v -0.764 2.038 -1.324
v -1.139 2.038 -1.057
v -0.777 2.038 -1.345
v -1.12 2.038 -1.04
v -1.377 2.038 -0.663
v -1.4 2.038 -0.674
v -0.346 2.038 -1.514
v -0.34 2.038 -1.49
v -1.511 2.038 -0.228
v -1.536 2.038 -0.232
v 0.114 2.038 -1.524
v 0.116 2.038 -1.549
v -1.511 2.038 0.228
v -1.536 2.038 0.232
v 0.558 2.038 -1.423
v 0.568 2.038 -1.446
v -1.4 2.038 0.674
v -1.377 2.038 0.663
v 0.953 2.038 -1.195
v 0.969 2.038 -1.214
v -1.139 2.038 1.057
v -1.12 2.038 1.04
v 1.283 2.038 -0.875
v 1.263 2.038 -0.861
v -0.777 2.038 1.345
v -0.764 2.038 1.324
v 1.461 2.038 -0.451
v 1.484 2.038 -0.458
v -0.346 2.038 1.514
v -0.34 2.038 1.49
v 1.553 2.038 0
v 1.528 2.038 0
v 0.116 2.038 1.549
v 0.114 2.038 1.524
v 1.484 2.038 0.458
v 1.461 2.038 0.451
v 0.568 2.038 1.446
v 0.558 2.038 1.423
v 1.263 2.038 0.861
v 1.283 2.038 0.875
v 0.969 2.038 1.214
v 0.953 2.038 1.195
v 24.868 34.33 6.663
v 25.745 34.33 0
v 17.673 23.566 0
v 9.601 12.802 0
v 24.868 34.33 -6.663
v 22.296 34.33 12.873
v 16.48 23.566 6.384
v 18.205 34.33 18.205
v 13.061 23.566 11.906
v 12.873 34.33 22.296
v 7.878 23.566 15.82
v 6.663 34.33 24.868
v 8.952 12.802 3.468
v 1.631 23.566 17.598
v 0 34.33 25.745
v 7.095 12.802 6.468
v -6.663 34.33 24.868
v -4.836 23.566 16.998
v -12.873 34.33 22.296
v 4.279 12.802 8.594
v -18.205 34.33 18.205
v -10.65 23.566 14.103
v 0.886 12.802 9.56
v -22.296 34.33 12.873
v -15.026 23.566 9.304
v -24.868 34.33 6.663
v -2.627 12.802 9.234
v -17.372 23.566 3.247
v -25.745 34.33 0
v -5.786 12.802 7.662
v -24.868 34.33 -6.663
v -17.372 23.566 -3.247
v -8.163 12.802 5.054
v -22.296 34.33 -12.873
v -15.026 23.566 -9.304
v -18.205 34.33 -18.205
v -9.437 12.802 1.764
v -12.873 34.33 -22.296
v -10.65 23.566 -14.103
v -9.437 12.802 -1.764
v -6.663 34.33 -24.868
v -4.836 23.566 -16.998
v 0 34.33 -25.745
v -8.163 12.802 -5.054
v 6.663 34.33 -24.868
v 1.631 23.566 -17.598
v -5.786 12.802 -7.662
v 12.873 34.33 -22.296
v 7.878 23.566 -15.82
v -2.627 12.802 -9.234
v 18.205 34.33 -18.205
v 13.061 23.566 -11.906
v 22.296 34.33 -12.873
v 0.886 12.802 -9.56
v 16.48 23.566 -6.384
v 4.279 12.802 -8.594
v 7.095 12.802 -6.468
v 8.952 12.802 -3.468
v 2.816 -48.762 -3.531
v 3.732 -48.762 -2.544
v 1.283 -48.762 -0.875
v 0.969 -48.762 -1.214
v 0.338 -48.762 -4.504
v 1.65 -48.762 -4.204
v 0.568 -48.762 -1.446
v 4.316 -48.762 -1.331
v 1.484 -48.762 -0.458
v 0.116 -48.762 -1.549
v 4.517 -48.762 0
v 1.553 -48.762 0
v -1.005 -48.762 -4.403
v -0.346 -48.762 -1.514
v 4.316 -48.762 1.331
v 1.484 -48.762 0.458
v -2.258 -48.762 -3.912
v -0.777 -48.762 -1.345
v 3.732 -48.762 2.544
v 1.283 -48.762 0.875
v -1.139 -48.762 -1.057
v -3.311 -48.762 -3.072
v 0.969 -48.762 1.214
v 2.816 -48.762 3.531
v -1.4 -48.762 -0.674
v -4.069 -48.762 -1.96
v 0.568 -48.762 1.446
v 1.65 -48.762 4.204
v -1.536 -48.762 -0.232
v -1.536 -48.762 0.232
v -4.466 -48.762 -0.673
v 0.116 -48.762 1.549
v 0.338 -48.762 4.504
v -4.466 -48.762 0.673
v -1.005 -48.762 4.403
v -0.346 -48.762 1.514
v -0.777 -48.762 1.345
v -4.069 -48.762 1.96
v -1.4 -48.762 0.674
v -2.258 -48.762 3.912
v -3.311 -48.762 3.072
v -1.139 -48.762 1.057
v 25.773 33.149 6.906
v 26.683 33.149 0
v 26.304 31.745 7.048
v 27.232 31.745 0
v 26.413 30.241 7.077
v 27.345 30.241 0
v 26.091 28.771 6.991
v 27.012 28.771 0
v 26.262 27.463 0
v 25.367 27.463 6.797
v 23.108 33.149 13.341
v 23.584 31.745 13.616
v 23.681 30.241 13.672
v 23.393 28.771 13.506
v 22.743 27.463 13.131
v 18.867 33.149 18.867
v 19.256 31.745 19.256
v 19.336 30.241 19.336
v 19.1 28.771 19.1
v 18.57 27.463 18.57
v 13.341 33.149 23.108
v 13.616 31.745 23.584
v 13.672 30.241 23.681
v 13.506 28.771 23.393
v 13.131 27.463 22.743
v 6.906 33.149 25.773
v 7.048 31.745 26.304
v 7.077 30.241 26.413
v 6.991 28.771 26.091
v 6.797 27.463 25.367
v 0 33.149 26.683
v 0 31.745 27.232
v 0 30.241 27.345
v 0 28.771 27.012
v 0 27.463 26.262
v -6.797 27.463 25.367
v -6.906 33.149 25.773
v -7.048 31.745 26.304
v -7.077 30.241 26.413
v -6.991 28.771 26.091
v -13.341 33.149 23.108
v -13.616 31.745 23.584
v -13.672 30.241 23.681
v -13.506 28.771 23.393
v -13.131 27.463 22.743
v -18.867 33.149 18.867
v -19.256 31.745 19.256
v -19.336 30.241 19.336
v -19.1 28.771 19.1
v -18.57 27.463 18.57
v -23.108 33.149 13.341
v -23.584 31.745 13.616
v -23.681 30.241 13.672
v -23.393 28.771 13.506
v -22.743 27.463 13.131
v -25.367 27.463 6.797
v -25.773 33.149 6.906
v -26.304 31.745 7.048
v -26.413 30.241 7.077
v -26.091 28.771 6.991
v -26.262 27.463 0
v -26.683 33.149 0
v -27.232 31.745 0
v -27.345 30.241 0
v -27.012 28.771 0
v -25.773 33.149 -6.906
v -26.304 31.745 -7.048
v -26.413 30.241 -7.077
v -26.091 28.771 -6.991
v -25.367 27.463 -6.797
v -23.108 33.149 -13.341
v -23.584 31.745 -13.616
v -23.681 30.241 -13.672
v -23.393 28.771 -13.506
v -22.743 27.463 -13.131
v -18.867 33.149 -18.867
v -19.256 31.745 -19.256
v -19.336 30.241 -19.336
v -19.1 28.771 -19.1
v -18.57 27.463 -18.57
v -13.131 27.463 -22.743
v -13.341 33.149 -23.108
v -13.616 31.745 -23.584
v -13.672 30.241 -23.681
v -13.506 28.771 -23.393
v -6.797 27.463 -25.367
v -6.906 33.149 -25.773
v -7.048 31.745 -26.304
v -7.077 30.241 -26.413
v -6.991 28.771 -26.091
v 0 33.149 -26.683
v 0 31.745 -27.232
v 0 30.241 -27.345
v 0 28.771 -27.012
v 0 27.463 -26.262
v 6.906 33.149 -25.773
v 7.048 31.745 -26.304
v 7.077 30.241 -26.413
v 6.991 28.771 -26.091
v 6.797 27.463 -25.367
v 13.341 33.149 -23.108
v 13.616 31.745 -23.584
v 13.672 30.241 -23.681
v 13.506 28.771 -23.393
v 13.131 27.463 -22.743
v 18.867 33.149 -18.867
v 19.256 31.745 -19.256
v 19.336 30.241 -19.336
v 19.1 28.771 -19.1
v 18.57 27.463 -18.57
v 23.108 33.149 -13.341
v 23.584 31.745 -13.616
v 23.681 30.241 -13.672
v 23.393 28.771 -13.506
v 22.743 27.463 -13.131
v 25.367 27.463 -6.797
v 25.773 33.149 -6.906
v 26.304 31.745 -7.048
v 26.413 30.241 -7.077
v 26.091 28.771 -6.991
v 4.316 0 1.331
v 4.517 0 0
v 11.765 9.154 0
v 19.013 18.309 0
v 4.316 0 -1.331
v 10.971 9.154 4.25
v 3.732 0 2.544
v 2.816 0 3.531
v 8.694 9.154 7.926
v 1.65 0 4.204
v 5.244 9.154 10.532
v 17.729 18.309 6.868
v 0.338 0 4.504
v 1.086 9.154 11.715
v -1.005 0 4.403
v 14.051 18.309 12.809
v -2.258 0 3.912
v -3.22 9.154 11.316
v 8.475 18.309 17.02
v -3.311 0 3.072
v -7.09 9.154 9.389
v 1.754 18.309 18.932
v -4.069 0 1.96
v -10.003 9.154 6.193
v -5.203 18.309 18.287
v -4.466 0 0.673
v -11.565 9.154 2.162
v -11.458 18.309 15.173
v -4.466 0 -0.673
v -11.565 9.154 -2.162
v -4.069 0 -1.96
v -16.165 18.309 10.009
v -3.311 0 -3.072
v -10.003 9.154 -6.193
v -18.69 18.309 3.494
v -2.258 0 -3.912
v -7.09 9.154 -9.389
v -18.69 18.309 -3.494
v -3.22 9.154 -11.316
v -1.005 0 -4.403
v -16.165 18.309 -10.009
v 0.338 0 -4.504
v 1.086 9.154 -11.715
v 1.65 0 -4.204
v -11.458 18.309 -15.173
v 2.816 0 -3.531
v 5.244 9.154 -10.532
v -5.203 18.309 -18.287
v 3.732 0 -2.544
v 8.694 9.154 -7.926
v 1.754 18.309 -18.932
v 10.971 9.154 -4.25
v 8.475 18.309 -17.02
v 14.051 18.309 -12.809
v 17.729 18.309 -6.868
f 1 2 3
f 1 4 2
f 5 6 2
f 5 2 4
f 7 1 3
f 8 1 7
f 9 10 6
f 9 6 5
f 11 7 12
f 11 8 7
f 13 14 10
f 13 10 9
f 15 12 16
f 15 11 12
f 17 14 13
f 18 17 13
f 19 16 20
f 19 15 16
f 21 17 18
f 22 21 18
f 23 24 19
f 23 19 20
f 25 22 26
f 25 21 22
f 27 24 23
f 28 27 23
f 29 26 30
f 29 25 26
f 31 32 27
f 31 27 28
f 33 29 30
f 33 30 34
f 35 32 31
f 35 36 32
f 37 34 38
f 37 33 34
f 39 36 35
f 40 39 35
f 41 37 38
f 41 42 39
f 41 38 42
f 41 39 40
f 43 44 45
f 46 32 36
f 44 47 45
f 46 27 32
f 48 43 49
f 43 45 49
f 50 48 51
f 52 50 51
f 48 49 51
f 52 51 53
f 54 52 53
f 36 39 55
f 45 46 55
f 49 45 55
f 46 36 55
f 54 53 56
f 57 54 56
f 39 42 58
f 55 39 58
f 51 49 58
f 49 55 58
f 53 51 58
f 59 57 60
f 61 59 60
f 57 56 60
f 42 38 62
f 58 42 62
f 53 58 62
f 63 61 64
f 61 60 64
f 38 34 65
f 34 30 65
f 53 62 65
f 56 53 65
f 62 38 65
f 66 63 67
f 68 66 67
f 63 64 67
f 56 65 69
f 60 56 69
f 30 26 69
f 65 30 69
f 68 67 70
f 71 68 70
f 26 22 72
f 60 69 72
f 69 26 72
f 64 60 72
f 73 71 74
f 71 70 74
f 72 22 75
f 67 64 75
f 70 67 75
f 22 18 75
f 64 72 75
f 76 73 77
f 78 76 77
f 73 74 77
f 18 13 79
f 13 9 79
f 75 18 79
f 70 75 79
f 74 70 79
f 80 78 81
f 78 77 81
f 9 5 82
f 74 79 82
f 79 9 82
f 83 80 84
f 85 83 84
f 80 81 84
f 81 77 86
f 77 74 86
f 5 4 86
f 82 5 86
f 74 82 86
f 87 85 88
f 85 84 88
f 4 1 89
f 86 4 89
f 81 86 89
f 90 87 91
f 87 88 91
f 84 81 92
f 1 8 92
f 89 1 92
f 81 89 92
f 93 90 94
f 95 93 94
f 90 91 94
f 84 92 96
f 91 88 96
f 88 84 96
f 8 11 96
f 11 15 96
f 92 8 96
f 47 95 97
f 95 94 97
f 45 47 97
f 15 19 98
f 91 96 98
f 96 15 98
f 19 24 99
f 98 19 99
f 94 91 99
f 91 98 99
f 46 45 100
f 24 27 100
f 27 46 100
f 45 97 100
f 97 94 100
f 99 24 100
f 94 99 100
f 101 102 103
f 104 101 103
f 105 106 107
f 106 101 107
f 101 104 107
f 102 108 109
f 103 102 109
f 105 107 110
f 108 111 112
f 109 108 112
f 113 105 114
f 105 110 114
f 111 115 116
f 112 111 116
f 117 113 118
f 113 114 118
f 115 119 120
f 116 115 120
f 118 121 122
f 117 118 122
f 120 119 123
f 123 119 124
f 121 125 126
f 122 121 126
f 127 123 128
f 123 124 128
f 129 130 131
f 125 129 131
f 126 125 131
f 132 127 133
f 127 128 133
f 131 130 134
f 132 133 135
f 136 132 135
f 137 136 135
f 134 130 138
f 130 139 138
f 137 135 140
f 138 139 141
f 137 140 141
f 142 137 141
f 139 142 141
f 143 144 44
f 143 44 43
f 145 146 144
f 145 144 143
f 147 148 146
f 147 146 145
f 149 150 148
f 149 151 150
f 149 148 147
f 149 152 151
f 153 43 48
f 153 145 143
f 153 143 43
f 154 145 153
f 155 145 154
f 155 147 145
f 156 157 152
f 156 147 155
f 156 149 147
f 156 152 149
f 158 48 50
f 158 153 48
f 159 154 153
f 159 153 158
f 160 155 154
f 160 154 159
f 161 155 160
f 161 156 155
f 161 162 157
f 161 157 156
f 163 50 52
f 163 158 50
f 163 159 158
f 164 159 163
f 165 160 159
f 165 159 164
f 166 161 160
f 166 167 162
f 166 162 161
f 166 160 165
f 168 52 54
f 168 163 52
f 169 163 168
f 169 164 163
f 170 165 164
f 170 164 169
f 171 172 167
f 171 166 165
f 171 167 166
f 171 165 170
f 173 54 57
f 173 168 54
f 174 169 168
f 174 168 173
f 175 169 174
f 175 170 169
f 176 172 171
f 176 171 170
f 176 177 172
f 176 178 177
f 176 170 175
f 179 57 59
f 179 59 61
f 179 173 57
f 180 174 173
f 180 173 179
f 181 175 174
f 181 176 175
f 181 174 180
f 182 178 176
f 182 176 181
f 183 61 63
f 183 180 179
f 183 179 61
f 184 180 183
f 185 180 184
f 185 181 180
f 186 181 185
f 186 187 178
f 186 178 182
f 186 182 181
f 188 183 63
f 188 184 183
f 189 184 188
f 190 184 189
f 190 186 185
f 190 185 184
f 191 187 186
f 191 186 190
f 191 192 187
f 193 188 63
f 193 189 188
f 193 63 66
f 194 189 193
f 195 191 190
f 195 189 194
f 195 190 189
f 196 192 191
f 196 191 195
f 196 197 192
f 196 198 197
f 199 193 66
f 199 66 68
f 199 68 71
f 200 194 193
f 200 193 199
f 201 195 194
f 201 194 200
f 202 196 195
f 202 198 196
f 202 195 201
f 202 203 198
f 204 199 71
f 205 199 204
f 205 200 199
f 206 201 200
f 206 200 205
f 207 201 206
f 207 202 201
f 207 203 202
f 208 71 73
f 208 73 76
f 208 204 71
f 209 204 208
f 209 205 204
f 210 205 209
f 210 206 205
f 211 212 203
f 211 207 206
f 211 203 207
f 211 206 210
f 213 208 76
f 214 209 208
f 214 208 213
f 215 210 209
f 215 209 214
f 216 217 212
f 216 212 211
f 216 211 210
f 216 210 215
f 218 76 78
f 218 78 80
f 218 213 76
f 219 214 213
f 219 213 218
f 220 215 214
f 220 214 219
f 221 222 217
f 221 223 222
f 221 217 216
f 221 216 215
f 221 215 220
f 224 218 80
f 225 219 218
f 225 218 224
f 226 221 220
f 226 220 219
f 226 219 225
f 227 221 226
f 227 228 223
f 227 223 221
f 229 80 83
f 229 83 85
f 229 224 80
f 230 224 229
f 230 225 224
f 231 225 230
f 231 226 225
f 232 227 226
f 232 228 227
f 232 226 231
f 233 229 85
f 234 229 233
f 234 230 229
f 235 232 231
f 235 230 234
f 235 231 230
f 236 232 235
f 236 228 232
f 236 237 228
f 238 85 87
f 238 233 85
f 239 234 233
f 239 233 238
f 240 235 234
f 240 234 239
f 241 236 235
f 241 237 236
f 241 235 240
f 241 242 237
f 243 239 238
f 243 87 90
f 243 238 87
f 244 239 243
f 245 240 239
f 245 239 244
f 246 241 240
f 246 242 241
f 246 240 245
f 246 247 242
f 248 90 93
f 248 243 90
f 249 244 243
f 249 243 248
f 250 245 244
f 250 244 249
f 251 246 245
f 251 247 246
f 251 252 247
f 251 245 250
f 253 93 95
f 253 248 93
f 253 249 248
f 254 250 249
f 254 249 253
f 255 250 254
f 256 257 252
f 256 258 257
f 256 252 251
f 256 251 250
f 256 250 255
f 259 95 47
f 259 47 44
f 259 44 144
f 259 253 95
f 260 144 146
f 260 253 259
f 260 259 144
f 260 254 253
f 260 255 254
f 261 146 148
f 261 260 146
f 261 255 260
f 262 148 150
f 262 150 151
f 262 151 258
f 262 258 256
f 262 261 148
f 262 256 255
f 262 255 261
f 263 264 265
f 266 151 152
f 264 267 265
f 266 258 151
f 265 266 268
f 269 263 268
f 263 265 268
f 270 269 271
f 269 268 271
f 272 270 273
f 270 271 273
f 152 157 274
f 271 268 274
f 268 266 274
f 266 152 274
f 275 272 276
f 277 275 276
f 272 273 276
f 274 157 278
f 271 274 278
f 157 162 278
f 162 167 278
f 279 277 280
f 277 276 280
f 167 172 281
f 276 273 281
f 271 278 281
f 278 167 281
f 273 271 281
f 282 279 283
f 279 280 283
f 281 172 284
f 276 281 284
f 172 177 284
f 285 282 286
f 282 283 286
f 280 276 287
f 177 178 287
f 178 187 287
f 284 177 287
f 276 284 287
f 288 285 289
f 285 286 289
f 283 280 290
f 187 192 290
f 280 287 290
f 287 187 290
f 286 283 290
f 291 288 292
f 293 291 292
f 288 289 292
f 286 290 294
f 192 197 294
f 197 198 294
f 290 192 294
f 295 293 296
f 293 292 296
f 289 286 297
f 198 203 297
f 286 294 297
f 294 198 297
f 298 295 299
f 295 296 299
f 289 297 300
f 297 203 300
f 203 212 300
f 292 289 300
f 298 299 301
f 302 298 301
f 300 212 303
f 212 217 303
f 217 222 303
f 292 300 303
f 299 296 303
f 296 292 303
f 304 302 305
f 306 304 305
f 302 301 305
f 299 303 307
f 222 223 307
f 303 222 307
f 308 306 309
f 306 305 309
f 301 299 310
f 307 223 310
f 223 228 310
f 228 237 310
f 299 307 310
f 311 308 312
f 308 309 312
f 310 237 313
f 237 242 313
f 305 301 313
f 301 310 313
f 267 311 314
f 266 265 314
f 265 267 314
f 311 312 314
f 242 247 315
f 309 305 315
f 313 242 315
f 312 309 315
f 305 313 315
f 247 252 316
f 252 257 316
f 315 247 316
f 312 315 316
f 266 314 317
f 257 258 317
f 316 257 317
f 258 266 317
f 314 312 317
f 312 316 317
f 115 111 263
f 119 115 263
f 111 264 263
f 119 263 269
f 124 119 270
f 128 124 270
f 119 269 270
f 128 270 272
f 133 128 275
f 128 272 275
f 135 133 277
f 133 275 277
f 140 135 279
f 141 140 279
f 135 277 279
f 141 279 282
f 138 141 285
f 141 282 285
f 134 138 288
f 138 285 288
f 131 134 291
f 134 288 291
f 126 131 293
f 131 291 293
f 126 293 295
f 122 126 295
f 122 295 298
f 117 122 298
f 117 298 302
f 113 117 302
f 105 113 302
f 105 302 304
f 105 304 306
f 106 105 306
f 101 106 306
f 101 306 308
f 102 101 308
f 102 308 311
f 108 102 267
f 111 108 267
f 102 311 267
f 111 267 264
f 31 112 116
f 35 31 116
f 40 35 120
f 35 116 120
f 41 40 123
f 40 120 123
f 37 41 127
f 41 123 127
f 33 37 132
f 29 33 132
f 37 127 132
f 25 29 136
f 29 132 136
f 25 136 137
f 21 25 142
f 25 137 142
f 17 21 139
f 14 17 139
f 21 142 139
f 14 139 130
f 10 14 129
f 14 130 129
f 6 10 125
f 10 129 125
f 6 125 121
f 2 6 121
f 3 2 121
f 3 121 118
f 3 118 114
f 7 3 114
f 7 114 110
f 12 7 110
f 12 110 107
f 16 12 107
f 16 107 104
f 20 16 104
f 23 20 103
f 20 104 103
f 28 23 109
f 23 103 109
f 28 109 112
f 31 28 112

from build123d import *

# Parameters (mm, degrees)
F2_R     = 1.5533685179
F3_DEPTH = 50.8


# Not quite as in the source:
# - a fillet or chamfer that OpenCascade refuses, or shapes differently, is made with other operations: its cross-section is extruded or revolved along the edge and cut away or added


with BuildPart() as f1:
    # F0 (on Top) → F1 (revolve)
    with BuildSketch(Plane.XY):
        Polygon((25.7452992698, 34.3298881523), (0, 0), (0, -48.7618558109), (4.5166942291, -48.7618558109), (4.5166942291, 0), (29.4045954943, 31.4324982464), align=None)
    revolve(axis=Axis((0, -24.3809279054, 0), (0, -1, 0)))

    # F2 (on face) → F3 (cut)
    with BuildSketch(Plane.XZ.offset(48.7618558109)):
        Circle(F2_R)
    extrude(amount=-F3_DEPTH, mode=Mode.SUBTRACT)

    # F4: fillet of radius 5.08 on 1 edges, made by hand

    # F4_s1 → F4_t2 (revolve, cut)
    with BuildSketch(Plane.XY):
        with BuildLine():
            ThreePointArc((25.7452992698, 34.3298881523), (27.3445295723, 30.9972333724), (26.261540234, 27.4629357709))
            Line((26.261540234, 27.4629357709), (26.3411945536, 27.3998663697))
            Line((26.3411945536, 27.3998663697), (29.4842498139, 31.3694288452))
            Line((29.4842498139, 31.3694288452), (29.4676648955, 31.5121525661))
            ThreePointArc((29.4676648955, 31.5121525661), (27.6380167832, 32.960847519), (25.8146287701, 34.4041577987))
            Line((25.8146287701, 34.4041577987), (25.7452992698, 34.3298881523))
        make_face()
    revolve(axis=Axis((0, 31.4324982464, 0), (0, -1, 0)), mode=Mode.SUBTRACT)


solid = f1.part
